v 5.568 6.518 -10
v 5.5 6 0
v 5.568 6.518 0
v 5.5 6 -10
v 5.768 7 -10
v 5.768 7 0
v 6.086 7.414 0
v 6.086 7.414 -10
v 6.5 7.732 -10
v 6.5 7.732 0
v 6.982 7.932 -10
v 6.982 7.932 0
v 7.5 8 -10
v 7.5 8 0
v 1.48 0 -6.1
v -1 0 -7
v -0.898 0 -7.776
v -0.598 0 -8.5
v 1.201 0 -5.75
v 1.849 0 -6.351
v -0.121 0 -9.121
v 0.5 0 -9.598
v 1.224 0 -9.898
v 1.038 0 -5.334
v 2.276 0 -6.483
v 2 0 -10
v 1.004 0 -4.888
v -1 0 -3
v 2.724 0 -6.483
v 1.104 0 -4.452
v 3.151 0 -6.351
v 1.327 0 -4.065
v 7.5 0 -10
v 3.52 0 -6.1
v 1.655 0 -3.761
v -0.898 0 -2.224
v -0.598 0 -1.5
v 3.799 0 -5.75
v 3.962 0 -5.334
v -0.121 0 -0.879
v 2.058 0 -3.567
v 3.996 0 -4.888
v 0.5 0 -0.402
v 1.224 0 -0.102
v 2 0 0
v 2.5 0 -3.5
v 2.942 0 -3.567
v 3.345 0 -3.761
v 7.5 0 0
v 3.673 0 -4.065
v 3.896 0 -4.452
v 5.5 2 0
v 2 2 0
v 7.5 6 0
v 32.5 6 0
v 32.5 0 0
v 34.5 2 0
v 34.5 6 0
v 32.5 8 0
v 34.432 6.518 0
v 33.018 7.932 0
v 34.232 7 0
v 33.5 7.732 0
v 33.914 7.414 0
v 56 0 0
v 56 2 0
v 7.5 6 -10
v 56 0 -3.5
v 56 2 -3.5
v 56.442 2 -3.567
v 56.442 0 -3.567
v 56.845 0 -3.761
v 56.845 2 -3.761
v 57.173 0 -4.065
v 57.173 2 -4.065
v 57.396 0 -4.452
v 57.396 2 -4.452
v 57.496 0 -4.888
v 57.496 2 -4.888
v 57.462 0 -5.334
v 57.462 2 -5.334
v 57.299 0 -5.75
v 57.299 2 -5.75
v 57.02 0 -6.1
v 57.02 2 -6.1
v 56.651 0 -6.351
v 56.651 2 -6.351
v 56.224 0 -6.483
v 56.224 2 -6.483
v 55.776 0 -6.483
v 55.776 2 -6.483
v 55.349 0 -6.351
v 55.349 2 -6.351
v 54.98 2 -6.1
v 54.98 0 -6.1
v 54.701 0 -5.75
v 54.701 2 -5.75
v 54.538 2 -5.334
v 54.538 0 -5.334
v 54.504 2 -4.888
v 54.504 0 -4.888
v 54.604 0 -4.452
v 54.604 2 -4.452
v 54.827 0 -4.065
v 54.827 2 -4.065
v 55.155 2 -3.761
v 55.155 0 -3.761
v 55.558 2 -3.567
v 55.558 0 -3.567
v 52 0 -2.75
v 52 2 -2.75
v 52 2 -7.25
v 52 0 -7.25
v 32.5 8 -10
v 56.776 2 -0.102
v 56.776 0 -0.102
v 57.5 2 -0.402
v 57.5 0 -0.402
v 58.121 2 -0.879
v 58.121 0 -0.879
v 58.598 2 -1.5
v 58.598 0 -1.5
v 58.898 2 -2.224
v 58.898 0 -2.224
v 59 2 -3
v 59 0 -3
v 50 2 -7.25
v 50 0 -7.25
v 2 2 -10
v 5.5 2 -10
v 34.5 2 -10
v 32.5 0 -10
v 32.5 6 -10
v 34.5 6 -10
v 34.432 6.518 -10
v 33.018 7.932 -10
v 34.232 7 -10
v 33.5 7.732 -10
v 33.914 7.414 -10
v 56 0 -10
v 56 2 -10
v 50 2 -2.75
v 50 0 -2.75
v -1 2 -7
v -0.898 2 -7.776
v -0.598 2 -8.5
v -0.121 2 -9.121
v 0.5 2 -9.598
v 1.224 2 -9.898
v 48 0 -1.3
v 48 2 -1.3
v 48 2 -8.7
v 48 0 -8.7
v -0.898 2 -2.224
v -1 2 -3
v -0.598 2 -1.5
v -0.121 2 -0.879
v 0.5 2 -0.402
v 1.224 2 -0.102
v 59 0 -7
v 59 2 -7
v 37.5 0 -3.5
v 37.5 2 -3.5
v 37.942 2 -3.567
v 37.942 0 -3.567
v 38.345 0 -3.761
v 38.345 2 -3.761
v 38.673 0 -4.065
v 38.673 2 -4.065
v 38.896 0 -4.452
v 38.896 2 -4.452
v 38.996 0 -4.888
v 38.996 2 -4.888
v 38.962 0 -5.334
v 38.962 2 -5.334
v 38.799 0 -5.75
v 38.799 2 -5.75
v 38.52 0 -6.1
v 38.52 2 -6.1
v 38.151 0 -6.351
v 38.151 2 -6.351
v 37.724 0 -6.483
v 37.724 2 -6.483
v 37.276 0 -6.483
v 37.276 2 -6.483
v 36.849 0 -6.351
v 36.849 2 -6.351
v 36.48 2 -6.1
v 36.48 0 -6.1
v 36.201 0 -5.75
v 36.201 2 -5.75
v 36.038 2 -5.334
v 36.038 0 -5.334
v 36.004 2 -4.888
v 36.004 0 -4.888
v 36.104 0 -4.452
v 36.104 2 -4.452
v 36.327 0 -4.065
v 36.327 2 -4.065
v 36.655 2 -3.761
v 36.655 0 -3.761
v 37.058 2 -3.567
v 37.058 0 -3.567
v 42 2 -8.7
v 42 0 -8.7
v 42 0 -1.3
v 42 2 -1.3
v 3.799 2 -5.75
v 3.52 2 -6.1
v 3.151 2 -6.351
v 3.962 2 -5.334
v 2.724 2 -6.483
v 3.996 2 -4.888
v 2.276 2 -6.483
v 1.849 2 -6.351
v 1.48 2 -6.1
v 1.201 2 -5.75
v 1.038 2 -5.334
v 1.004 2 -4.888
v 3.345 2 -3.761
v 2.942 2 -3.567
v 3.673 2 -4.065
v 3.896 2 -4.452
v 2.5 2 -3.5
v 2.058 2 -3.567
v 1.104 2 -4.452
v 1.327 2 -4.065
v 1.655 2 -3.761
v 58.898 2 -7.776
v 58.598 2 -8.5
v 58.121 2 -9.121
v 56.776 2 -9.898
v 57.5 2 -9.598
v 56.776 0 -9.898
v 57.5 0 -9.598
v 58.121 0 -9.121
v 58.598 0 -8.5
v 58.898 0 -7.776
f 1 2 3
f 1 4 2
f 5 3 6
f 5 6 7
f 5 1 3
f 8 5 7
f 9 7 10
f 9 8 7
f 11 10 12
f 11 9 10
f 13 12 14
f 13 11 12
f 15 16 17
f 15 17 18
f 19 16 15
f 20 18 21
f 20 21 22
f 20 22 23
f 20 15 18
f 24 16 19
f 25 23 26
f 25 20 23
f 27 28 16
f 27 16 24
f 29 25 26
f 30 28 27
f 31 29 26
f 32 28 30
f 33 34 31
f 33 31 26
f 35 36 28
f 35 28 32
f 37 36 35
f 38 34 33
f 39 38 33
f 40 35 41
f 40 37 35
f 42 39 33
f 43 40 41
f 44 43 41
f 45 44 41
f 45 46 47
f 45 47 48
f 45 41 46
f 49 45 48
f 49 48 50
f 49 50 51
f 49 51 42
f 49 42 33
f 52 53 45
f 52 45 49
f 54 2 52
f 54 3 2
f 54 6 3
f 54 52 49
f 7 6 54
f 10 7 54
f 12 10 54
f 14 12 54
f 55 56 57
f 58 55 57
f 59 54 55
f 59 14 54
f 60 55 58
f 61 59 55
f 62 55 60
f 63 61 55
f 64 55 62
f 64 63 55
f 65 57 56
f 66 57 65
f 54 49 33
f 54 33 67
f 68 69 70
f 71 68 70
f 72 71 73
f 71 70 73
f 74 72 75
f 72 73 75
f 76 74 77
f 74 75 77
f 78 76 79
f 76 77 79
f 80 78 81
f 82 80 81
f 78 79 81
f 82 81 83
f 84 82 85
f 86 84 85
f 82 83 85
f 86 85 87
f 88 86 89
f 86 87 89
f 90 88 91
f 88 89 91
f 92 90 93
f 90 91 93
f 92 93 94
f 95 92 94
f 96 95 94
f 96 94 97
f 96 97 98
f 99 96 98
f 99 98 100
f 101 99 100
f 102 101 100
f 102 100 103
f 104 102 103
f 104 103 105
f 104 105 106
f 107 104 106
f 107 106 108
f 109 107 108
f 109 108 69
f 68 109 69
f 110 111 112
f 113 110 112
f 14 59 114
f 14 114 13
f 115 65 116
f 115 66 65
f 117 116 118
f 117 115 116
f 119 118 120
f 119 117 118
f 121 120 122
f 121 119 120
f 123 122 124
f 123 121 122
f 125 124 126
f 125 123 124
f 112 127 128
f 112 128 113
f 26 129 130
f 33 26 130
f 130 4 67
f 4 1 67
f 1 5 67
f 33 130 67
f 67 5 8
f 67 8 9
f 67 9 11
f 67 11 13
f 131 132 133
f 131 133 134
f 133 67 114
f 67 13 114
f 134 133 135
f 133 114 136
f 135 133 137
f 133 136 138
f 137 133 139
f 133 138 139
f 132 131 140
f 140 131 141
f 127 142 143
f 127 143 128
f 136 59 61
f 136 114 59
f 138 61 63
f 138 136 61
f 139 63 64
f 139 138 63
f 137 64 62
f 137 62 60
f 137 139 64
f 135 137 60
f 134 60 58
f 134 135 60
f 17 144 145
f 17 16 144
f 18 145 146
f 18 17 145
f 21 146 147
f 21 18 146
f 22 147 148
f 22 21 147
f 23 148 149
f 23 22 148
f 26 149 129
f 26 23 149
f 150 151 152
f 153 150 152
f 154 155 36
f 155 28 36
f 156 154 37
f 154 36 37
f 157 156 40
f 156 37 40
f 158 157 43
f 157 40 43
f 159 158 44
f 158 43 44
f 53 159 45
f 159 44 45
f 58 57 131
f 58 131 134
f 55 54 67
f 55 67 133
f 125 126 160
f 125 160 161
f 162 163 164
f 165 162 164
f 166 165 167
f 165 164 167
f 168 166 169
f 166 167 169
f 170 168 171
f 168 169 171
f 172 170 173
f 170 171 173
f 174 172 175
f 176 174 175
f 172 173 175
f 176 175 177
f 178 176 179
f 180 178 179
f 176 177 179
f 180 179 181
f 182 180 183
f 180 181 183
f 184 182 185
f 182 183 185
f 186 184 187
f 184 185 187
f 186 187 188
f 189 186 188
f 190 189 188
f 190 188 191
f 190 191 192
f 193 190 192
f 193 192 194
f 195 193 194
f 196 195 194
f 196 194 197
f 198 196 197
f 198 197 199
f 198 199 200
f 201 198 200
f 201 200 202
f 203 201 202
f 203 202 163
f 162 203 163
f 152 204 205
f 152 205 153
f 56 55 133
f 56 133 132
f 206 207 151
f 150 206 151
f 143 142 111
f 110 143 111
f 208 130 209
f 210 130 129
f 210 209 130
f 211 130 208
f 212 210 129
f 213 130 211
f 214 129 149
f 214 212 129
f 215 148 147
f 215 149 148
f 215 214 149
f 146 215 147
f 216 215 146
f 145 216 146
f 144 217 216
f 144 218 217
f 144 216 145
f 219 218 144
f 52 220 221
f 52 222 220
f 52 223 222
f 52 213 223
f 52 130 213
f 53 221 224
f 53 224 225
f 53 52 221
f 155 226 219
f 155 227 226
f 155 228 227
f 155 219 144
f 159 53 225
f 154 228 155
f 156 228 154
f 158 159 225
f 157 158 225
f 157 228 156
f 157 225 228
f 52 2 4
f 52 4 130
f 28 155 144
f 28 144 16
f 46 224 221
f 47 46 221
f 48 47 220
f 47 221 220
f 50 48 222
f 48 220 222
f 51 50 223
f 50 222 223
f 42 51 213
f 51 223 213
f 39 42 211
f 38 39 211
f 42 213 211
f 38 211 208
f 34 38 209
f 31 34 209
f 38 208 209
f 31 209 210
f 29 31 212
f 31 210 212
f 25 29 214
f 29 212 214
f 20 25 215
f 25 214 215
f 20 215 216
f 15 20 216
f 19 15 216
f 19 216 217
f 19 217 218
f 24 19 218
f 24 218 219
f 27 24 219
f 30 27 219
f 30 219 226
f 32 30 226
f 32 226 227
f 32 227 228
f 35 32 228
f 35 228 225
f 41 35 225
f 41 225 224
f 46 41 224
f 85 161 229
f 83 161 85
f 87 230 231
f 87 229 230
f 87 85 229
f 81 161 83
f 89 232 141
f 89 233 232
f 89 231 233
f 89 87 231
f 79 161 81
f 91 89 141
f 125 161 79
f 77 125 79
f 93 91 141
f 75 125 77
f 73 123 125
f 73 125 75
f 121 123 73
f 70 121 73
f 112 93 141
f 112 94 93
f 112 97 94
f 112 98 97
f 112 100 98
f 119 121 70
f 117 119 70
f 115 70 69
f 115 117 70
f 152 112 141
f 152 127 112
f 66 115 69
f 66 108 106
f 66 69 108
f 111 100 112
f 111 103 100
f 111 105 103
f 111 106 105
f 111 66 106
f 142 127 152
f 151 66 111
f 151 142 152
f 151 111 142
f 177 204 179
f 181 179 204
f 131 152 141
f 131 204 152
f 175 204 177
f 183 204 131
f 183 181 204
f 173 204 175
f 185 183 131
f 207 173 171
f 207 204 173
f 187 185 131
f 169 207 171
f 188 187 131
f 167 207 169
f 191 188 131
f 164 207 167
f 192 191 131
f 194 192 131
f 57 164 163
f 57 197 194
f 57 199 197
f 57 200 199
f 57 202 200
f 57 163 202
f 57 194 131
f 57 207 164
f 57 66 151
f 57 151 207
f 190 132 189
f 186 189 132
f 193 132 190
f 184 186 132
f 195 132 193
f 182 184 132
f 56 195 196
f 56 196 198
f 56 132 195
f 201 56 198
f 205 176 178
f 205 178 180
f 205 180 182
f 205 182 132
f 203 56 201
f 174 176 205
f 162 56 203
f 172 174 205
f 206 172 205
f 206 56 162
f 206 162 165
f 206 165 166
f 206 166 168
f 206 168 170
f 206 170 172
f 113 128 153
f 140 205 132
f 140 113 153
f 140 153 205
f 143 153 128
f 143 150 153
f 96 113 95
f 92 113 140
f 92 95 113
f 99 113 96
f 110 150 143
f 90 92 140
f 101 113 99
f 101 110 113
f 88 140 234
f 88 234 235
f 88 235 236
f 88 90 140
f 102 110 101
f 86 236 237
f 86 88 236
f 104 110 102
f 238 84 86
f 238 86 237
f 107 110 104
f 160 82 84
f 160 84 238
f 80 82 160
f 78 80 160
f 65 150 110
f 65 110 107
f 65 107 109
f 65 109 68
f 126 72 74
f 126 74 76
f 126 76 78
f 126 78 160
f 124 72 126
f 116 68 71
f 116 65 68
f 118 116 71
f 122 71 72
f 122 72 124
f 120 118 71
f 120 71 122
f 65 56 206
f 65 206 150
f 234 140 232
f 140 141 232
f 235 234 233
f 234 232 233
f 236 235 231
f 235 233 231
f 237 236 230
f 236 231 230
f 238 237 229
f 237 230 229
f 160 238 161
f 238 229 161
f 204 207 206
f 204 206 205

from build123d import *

# Parameters (mm, degrees)
EXTRUIR_L_MINA1_DEPTH = 10
CROQUIS2_R            = 1.5
CORTAR_EXTRUIR1_DEPTH = 61.141499815
REDONDEO2_R           = 3
REDONDEO3_R           = 2
CROQUIS3_W            = 6
CROQUIS3_H            = 7.4
CROQUIS3_W_2          = 2
CROQUIS3_H_2          = 4.5
CORTAR_EXTRUIR2_DEPTH = 61.141499815


with BuildPart() as part:
    # Croquis1 → Extruir-Lámina1 (new body)
    with BuildSketch(Plane.XY):
        Polygon((-1, 0), (0, 0), (7.5, 0), (7.5, 6), (32.5, 6), (32.5, 0), (41.5, 0), (59, 0), (59, 2), (41.5, 2), (34.5, 2), (34.5, 8), (5.5, 8), (5.5, 2), (0, 2), (-1, 2), align=None)
    extrude(amount=-EXTRUIR_L_MINA1_DEPTH)

    # Croquis2 → Cortar-Extruir1 (cut, through all)
    with BuildSketch(Plane(origin=(0, 2, 0), x_dir=(1, 0, 0), z_dir=(0, 1, 0))):
        with Locations(Location((2.5, 5, 0), (0, 0, 270))):
            Circle(CROQUIS2_R)
        with Locations(Location((37.5, 5, 0), (0, 0, 270))):
            Circle(CROQUIS2_R)
        with Locations(Location((56, 5, 0), (0, 0, 270))):
            Circle(CROQUIS2_R)
    extrude(amount=-CORTAR_EXTRUIR1_DEPTH, mode=Mode.SUBTRACT)

    # Redondeo2
    redondeo2_edges = [part.edges().sort_by_distance(p)[0] for p in [
        (-1, 1, 0),
        (59, 1, 0),
        (-1, 1, -10),
        (59, 1, -10),
    ]]
    fillet(redondeo2_edges, radius=REDONDEO2_R)

    # Redondeo3
    redondeo3_edges = [part.edges().sort_by_distance(p)[0] for p in [
        (5.5, 8, -5),
        (34.5, 8, -5),
    ]]
    fillet(redondeo3_edges, radius=REDONDEO3_R)

    # Croquis3 → Cortar-Extruir2 (cut, through all)
    with BuildSketch(Plane(origin=(0, 2, 0), x_dir=(1, 0, 0), z_dir=(0, 1, 0))):
        with Locations((45, 5)):
            Rectangle(CROQUIS3_W, CROQUIS3_H)
        with Locations((51, 5)):
            Rectangle(CROQUIS3_W_2, CROQUIS3_H_2)
    extrude(amount=-CORTAR_EXTRUIR2_DEPTH, mode=Mode.SUBTRACT)


solid = part.part
